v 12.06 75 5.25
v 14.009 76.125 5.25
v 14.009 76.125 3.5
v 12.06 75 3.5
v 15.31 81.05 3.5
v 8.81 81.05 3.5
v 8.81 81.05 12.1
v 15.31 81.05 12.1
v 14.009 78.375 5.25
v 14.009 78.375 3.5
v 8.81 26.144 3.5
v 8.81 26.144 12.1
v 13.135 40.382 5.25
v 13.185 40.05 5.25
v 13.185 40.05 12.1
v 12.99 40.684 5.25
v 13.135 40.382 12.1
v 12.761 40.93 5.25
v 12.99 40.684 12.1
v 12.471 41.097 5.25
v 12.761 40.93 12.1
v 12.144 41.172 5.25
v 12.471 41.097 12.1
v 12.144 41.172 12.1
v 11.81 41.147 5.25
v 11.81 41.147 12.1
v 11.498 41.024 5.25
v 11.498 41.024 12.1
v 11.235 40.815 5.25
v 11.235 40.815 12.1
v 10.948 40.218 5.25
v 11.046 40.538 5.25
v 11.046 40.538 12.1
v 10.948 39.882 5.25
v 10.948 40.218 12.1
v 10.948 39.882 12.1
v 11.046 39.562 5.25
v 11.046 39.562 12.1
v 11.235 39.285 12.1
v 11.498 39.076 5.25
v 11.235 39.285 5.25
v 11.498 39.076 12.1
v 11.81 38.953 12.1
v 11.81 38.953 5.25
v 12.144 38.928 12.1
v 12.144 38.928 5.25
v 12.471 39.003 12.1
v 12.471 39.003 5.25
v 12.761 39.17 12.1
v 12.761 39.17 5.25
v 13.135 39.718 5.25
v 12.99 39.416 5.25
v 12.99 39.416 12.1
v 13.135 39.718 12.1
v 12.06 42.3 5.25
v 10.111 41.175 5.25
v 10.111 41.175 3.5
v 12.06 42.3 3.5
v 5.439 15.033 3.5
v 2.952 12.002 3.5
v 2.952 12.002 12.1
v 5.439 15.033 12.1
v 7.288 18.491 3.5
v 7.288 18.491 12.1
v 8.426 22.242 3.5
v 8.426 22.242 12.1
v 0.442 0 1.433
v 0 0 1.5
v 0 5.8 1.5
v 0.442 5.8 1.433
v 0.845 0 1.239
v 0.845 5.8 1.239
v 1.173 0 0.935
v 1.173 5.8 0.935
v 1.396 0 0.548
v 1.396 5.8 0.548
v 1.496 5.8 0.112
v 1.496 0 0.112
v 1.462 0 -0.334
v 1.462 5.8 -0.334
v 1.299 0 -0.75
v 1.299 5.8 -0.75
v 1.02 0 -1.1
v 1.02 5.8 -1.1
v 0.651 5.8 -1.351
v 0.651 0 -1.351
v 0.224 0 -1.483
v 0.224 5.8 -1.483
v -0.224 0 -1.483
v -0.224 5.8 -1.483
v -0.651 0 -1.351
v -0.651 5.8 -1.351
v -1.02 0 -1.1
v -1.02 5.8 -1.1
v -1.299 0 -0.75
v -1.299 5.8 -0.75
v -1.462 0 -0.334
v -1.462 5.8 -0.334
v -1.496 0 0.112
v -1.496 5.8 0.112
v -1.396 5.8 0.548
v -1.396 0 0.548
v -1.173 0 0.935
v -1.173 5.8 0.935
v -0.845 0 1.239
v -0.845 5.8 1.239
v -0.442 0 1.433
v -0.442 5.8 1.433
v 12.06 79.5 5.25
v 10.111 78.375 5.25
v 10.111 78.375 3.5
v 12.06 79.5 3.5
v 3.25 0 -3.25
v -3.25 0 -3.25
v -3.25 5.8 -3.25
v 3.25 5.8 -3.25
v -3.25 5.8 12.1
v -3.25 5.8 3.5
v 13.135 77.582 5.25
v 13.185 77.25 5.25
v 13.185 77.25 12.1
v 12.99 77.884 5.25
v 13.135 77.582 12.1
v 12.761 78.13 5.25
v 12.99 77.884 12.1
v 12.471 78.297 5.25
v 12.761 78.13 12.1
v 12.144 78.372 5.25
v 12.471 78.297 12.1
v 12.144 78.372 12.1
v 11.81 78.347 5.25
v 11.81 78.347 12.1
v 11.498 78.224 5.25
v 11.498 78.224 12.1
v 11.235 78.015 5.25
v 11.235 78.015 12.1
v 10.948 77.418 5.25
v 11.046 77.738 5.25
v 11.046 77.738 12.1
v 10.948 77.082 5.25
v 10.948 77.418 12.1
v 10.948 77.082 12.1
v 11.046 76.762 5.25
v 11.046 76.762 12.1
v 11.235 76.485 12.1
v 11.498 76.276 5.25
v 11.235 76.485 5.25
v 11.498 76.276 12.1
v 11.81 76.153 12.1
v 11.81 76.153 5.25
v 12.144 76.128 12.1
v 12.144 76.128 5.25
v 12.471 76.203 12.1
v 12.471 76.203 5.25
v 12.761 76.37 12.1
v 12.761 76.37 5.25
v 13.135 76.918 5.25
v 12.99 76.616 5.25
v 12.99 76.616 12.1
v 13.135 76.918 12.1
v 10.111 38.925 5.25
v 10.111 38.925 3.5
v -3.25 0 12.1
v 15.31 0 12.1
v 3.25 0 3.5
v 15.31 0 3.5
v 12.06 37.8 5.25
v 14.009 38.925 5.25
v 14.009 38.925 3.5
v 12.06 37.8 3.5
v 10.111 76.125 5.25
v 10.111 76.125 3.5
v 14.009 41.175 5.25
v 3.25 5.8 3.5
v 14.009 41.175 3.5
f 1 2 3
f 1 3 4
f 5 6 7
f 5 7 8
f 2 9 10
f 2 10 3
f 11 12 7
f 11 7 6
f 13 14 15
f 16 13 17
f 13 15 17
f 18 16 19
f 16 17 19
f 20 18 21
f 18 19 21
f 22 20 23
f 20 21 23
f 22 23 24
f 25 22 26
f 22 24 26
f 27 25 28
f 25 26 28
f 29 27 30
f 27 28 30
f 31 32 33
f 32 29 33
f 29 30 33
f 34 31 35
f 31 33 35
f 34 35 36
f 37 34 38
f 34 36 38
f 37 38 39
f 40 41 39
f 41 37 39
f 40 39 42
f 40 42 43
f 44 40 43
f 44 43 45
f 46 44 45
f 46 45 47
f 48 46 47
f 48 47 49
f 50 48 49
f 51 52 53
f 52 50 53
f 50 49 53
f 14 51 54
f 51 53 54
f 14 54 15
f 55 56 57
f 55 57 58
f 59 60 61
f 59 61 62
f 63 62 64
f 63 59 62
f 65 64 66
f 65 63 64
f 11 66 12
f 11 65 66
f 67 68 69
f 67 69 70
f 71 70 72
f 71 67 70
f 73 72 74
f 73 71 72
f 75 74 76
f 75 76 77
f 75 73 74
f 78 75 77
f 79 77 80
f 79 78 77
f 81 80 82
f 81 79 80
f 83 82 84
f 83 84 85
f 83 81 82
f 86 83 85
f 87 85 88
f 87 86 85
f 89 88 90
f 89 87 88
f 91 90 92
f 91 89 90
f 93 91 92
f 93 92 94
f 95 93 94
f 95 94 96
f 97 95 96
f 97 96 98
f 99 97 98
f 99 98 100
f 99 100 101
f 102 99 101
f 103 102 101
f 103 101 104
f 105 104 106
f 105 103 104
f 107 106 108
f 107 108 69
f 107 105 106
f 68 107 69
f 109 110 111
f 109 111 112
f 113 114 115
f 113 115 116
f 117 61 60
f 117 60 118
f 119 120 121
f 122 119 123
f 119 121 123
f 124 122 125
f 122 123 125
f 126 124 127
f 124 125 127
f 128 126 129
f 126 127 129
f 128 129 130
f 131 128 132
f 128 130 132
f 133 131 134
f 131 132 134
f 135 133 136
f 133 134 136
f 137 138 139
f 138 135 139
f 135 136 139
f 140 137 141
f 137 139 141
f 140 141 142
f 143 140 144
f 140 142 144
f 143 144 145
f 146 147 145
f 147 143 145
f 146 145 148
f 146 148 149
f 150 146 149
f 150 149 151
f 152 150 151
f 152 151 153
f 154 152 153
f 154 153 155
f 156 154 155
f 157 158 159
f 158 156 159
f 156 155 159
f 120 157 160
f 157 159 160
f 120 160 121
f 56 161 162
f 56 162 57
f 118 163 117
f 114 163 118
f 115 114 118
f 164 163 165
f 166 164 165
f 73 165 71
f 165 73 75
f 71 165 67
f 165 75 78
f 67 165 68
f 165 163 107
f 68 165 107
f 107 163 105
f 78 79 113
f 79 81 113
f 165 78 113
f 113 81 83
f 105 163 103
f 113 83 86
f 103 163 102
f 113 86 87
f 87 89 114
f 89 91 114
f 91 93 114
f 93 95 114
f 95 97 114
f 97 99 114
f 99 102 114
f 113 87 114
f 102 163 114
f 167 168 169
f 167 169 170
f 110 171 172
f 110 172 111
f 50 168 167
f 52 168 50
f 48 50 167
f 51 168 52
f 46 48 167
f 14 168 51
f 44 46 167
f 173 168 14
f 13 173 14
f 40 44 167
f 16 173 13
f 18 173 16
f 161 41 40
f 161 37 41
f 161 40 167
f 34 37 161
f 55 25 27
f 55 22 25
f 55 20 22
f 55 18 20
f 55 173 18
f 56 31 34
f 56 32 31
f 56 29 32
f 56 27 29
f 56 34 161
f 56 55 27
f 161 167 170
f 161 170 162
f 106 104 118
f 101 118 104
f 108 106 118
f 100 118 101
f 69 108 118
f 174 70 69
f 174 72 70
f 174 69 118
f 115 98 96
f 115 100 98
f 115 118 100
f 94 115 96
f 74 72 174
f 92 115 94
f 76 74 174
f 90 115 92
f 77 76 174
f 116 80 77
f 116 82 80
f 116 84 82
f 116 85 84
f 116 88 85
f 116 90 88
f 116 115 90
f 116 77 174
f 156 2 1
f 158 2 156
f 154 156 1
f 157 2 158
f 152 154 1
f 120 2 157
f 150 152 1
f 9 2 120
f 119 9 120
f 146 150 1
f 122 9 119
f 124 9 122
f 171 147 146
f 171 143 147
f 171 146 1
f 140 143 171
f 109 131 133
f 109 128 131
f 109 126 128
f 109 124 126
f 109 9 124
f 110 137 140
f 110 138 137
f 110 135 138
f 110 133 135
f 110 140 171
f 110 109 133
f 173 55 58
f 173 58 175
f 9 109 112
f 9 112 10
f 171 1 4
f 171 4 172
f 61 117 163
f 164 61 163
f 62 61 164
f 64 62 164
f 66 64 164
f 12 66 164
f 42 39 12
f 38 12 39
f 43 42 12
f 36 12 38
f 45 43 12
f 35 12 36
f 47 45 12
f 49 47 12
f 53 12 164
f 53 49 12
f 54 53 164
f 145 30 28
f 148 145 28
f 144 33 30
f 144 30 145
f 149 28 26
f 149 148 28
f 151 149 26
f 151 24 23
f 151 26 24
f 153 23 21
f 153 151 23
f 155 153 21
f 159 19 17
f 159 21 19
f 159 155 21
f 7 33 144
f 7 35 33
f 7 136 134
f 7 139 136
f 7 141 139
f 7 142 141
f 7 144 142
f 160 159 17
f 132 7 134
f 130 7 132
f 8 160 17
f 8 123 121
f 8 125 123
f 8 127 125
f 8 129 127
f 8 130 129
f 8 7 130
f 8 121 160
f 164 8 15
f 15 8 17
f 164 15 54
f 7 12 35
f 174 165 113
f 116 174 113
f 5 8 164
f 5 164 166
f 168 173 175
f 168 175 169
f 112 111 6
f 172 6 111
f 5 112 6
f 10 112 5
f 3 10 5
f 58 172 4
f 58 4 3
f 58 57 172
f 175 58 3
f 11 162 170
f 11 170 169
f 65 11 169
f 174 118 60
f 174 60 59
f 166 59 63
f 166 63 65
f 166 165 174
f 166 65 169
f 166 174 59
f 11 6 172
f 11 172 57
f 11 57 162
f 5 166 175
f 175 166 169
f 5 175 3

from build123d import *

# Parameters (mm, degrees)
SKETCH1_W           = 6.5
SKETCH1_H           = 6.5
SKETCH1_R           = 1.5
BOSS_EXTRUDE1_DEPTH = 5.8
SKETCH2_W           = 6.5
SKETCH2_H           = 5.8
BOSS_EXTRUDE2_DEPTH = 8.85
SKETCH6_W           = 8.85
SKETCH6_H           = 5.8
BOSS_EXTRUDE6_DEPTH = 12.06
SKETCH7_W           = 6.5
SKETCH7_H           = 8.85
BOSS_EXTRUDE7_DEPTH = 75.25
BOSS_EXTRUDE8_DEPTH = 8.85
FILLET3_R           = 20
SKETCH10_R          = 1.125
CUT_EXTRUDE1_DEPTH  = 84.899470201
CUT_EXTRUDE2_START  = -2
SKETCH11_R          = 1.125
CUT_EXTRUDE2_DEPTH  = 2
SKETCH13_W          = 12.06
SKETCH13_H          = 0.25
CUT_EXTRUDE4_DEPTH  = 84.36611182
SKETCH14_W          = 6.5
SKETCH14_H          = 0.25
CUT_EXTRUDE5_DEPTH  = 78.739105989


with BuildPart() as part:
    # Sketch1 → Boss-Extrude1 (new body)
    with BuildSketch(Plane(origin=(0, 0, 0), x_dir=(1, 0, 0), z_dir=(0, 1, 0))):
        Rectangle(SKETCH1_W, SKETCH1_H)
        with Locations(Location((0, 0, 0), (0, 0, 270))):
            Circle(SKETCH1_R, mode=Mode.SUBTRACT)
    extrude(amount=BOSS_EXTRUDE1_DEPTH)

    # Sketch2 → Boss-Extrude2 (add)
    with BuildSketch(Plane.XY.offset(3.25)):
        with Locations((0, 2.9)):
            Rectangle(SKETCH2_W, SKETCH2_H)
    extrude(amount=BOSS_EXTRUDE2_DEPTH)

    # Sketch6 → Boss-Extrude6 (add)
    with BuildSketch(Plane(origin=(3.25, 0, 0), x_dir=(0, 0, -1), z_dir=(1, 0, 0))):
        with Locations((-7.675, 2.9)):
            Rectangle(SKETCH6_W, SKETCH6_H)
    extrude(amount=BOSS_EXTRUDE6_DEPTH)

    # Sketch7 → Boss-Extrude7 (add)
    with BuildSketch(Plane(origin=(0, 5.8, 0), x_dir=(1, 0, 0), z_dir=(0, 1, 0))):
        with Locations((12.06, -7.675)):
            Rectangle(SKETCH7_W, SKETCH7_H)
    extrude(amount=BOSS_EXTRUDE7_DEPTH)

    # Sketch8 → Boss-Extrude8 (add)
    with BuildSketch(Plane.XY.offset(12.1)):
        Polygon((-3.25, 5.8), (8.81, 5.8), (8.81, 17.86), align=None)
    extrude(amount=-BOSS_EXTRUDE8_DEPTH)

    # Fillet3
    fillet3_edges = [part.edges().sort_by_distance(p)[0] for p in [
        (8.81, 17.86, 7.675),
    ]]
    fillet(fillet3_edges, radius=FILLET3_R)

    # Sketch10 → Cut-Extrude1 (cut, through all)
    with BuildSketch(Plane.XY.offset(12.1)):
        with Locations((12.06, 77.25)):
            Circle(SKETCH10_R)
        with Locations((12.06, 40.05)):
            Circle(SKETCH10_R)
    extrude(amount=-CUT_EXTRUDE1_DEPTH, mode=Mode.SUBTRACT)

    # Sketch11 → Cut-Extrude2 (cut)
    # profile 1 of 2: a face of its own
    with BuildSketch(Plane(origin=(0, 0, 3.25), x_dir=(-1, 0, 0), z_dir=(0, 0, -1)).offset(CUT_EXTRUDE2_START)):
        Polygon((-10.111442841, 76.125), (-10.111442841, 78.375), (-12.06, 79.5), (-14.008557159, 78.375), (-14.008557159, 76.125), (-12.06, 75), align=None)
        with Locations(Location((-12.06, 77.25, 0), (0, 0, 180))):
            Circle(SKETCH11_R, mode=Mode.SUBTRACT)
    # profile 2 of 2: a face of its own
    with BuildSketch(Plane(origin=(0, 0, 3.25), x_dir=(-1, 0, 0), z_dir=(0, 0, -1)).offset(CUT_EXTRUDE2_START)):
        Polygon((-10.111442841, 38.925), (-10.111442841, 41.175), (-12.06, 42.3), (-14.008557159, 41.175), (-14.008557159, 38.925), (-12.06, 37.8), align=None)
        with Locations(Location((-12.06, 40.05, 0), (0, 0, 180))):
            Circle(SKETCH11_R, mode=Mode.SUBTRACT)
    extrude(amount=CUT_EXTRUDE2_DEPTH, mode=Mode.SUBTRACT)

    # Sketch13 → Cut-Extrude4 (cut, through all)
    with BuildSketch(Plane(origin=(0, 0, 0), x_dir=(-1, 0, 0), z_dir=(0, -1, 0))):
        with Locations((-9.28, -3.375)):
            Rectangle(SKETCH13_W, SKETCH13_H)
    extrude(amount=-CUT_EXTRUDE4_DEPTH, mode=Mode.SUBTRACT)

    # Sketch14 → Cut-Extrude5 (cut, through all)
    with BuildSketch(Plane(origin=(0, 5.8, 0), x_dir=(1, 0, 0), z_dir=(0, 1, 0))):
        with Locations((0, -3.375)):
            Rectangle(SKETCH14_W, SKETCH14_H)
    extrude(amount=CUT_EXTRUDE5_DEPTH, mode=Mode.SUBTRACT)


solid = part.part
